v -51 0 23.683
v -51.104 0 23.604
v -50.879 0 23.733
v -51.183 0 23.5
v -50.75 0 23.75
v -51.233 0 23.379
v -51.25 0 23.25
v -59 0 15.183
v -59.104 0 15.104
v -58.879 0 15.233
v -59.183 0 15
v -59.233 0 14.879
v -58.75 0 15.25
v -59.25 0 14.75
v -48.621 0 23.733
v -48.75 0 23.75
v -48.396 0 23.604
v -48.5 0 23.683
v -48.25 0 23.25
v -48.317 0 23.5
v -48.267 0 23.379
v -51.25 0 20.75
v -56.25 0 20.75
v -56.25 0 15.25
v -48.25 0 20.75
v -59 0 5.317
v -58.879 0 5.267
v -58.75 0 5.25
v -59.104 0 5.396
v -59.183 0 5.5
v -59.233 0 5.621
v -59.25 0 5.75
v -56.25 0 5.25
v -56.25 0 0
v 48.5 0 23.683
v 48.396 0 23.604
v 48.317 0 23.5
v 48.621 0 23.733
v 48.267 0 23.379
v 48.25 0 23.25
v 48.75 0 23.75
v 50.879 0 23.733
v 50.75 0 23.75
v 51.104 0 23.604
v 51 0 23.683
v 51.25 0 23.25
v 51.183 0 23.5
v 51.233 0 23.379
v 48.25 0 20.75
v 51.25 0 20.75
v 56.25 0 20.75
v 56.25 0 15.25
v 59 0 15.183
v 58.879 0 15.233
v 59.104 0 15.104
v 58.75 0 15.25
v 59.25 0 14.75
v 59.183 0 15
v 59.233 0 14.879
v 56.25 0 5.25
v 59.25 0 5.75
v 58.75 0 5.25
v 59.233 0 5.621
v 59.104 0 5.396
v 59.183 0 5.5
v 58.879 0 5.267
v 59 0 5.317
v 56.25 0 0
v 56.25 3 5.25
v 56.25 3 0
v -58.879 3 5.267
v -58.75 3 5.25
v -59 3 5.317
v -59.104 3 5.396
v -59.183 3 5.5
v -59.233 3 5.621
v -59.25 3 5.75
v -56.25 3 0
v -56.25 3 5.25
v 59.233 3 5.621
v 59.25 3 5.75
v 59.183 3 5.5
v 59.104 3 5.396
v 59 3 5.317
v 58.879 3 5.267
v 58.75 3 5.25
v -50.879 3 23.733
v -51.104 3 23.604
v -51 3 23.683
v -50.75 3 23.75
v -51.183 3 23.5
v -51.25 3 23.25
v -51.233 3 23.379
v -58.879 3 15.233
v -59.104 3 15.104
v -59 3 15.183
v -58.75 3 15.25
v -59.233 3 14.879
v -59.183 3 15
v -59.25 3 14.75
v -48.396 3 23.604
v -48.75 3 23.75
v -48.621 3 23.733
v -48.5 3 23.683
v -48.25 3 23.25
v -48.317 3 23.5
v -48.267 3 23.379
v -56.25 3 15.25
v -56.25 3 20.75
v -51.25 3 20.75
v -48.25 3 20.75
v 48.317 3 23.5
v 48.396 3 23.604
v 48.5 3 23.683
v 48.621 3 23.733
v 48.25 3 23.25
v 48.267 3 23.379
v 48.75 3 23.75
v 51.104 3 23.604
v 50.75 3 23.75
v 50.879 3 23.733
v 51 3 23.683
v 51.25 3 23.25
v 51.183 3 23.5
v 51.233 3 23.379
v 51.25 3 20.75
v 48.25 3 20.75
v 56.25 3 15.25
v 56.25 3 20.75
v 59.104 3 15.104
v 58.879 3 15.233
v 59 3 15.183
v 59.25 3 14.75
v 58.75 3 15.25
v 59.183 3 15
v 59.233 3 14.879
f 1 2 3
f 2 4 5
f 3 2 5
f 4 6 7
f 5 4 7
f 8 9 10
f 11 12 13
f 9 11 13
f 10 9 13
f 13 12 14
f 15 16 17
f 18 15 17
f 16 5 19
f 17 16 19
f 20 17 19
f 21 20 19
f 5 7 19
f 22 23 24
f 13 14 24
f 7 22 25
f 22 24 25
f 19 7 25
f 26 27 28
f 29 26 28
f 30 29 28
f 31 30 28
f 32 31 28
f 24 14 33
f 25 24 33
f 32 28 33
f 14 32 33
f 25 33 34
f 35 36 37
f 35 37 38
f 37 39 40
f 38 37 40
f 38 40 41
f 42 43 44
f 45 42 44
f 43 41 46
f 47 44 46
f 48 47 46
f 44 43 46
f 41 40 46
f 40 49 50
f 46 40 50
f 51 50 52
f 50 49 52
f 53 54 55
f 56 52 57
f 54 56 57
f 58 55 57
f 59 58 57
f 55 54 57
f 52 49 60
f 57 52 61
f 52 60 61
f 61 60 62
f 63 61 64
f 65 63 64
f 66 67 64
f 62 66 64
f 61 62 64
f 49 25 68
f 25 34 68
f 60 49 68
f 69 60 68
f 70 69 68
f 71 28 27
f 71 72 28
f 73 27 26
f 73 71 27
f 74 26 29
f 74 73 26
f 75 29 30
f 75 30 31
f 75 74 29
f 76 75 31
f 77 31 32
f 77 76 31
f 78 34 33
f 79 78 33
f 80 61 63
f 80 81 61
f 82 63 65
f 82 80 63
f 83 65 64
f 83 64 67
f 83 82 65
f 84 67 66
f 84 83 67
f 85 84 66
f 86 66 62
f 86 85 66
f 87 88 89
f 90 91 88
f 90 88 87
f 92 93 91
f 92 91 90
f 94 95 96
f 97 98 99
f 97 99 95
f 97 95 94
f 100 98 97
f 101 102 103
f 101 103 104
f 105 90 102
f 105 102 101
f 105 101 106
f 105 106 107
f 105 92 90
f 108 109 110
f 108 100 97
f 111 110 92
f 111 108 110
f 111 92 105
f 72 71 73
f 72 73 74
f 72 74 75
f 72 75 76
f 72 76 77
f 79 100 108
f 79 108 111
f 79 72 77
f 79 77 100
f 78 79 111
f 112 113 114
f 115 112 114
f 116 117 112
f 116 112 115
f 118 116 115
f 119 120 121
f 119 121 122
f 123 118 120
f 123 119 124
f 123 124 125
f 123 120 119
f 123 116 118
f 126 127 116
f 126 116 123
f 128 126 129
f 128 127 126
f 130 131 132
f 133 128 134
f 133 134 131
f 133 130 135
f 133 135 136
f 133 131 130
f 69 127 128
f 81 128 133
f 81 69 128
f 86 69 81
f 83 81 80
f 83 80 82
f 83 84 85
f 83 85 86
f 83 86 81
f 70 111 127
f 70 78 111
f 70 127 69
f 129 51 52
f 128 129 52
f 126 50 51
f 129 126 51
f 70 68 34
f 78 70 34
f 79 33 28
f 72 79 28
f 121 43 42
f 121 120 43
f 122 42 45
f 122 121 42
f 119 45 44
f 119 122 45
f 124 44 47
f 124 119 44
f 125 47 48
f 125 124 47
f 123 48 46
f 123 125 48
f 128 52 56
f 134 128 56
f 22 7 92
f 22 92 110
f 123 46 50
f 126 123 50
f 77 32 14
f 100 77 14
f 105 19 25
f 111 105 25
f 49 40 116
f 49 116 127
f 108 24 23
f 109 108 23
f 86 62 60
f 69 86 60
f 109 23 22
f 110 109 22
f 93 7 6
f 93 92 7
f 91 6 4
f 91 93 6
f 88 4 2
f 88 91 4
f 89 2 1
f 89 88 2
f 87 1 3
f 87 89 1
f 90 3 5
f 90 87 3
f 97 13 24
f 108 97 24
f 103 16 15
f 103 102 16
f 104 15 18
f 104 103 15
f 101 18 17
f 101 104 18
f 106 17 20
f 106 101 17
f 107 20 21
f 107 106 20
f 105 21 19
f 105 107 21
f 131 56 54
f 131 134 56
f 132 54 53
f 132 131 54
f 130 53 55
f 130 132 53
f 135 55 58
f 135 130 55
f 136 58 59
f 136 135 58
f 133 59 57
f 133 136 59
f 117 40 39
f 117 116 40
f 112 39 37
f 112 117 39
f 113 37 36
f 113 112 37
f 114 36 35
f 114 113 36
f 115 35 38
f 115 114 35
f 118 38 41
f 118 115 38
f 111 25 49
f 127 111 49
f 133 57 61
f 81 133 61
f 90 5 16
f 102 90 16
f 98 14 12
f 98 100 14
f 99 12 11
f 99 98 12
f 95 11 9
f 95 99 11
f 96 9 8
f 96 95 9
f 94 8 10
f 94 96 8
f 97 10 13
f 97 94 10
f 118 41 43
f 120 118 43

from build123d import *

# Parameters (mm, degrees)
SKETCH_1_W      = 3
SKETCH_1_H      = 3
EXTRUDE_1_DEPTH = 3
FILLET_1_R      = 0.5


with BuildPart() as part:
    # Эскиз1 → Бобышка-Вытянуть1 (new body)
    with BuildSketch(Plane(origin=(0, 0, 0), x_dir=(1, 0, 0), z_dir=(0, 1, 0))):
        Polygon((-56.25, -20.75), (56.25, -20.75), (56.25, -15.25), (59.25, -15.25), (59.25, -5.25), (56.25, -5.25), (56.25, 0), (-56.25, 0), (-56.25, -5.25), (-59.25, -5.25), (-59.25, -15.25), (-56.25, -15.25), align=None)
        with Locations((49.75, -22.25)):
            Rectangle(SKETCH_1_W, SKETCH_1_H)
        with Locations((-49.75, -22.25)):
            Rectangle(SKETCH_1_W, SKETCH_1_H)
    extrude(amount=EXTRUDE_1_DEPTH)

    # Скругление1
    fillet_1_edges = [part.edges().sort_by_distance(p)[0] for p in [
        (-59.25, 1.5, 15.25),
        (-59.25, 1.5, 5.25),
        (59.25, 1.5, 5.25),
        (59.25, 1.5, 15.25),
        (51.25, 1.5, 23.75),
        (48.25, 1.5, 23.75),
        (-48.25, 1.5, 23.75),
        (-51.25, 1.5, 23.75),
    ]]
    fillet(fillet_1_edges, radius=FILLET_1_R)


solid = part.part
